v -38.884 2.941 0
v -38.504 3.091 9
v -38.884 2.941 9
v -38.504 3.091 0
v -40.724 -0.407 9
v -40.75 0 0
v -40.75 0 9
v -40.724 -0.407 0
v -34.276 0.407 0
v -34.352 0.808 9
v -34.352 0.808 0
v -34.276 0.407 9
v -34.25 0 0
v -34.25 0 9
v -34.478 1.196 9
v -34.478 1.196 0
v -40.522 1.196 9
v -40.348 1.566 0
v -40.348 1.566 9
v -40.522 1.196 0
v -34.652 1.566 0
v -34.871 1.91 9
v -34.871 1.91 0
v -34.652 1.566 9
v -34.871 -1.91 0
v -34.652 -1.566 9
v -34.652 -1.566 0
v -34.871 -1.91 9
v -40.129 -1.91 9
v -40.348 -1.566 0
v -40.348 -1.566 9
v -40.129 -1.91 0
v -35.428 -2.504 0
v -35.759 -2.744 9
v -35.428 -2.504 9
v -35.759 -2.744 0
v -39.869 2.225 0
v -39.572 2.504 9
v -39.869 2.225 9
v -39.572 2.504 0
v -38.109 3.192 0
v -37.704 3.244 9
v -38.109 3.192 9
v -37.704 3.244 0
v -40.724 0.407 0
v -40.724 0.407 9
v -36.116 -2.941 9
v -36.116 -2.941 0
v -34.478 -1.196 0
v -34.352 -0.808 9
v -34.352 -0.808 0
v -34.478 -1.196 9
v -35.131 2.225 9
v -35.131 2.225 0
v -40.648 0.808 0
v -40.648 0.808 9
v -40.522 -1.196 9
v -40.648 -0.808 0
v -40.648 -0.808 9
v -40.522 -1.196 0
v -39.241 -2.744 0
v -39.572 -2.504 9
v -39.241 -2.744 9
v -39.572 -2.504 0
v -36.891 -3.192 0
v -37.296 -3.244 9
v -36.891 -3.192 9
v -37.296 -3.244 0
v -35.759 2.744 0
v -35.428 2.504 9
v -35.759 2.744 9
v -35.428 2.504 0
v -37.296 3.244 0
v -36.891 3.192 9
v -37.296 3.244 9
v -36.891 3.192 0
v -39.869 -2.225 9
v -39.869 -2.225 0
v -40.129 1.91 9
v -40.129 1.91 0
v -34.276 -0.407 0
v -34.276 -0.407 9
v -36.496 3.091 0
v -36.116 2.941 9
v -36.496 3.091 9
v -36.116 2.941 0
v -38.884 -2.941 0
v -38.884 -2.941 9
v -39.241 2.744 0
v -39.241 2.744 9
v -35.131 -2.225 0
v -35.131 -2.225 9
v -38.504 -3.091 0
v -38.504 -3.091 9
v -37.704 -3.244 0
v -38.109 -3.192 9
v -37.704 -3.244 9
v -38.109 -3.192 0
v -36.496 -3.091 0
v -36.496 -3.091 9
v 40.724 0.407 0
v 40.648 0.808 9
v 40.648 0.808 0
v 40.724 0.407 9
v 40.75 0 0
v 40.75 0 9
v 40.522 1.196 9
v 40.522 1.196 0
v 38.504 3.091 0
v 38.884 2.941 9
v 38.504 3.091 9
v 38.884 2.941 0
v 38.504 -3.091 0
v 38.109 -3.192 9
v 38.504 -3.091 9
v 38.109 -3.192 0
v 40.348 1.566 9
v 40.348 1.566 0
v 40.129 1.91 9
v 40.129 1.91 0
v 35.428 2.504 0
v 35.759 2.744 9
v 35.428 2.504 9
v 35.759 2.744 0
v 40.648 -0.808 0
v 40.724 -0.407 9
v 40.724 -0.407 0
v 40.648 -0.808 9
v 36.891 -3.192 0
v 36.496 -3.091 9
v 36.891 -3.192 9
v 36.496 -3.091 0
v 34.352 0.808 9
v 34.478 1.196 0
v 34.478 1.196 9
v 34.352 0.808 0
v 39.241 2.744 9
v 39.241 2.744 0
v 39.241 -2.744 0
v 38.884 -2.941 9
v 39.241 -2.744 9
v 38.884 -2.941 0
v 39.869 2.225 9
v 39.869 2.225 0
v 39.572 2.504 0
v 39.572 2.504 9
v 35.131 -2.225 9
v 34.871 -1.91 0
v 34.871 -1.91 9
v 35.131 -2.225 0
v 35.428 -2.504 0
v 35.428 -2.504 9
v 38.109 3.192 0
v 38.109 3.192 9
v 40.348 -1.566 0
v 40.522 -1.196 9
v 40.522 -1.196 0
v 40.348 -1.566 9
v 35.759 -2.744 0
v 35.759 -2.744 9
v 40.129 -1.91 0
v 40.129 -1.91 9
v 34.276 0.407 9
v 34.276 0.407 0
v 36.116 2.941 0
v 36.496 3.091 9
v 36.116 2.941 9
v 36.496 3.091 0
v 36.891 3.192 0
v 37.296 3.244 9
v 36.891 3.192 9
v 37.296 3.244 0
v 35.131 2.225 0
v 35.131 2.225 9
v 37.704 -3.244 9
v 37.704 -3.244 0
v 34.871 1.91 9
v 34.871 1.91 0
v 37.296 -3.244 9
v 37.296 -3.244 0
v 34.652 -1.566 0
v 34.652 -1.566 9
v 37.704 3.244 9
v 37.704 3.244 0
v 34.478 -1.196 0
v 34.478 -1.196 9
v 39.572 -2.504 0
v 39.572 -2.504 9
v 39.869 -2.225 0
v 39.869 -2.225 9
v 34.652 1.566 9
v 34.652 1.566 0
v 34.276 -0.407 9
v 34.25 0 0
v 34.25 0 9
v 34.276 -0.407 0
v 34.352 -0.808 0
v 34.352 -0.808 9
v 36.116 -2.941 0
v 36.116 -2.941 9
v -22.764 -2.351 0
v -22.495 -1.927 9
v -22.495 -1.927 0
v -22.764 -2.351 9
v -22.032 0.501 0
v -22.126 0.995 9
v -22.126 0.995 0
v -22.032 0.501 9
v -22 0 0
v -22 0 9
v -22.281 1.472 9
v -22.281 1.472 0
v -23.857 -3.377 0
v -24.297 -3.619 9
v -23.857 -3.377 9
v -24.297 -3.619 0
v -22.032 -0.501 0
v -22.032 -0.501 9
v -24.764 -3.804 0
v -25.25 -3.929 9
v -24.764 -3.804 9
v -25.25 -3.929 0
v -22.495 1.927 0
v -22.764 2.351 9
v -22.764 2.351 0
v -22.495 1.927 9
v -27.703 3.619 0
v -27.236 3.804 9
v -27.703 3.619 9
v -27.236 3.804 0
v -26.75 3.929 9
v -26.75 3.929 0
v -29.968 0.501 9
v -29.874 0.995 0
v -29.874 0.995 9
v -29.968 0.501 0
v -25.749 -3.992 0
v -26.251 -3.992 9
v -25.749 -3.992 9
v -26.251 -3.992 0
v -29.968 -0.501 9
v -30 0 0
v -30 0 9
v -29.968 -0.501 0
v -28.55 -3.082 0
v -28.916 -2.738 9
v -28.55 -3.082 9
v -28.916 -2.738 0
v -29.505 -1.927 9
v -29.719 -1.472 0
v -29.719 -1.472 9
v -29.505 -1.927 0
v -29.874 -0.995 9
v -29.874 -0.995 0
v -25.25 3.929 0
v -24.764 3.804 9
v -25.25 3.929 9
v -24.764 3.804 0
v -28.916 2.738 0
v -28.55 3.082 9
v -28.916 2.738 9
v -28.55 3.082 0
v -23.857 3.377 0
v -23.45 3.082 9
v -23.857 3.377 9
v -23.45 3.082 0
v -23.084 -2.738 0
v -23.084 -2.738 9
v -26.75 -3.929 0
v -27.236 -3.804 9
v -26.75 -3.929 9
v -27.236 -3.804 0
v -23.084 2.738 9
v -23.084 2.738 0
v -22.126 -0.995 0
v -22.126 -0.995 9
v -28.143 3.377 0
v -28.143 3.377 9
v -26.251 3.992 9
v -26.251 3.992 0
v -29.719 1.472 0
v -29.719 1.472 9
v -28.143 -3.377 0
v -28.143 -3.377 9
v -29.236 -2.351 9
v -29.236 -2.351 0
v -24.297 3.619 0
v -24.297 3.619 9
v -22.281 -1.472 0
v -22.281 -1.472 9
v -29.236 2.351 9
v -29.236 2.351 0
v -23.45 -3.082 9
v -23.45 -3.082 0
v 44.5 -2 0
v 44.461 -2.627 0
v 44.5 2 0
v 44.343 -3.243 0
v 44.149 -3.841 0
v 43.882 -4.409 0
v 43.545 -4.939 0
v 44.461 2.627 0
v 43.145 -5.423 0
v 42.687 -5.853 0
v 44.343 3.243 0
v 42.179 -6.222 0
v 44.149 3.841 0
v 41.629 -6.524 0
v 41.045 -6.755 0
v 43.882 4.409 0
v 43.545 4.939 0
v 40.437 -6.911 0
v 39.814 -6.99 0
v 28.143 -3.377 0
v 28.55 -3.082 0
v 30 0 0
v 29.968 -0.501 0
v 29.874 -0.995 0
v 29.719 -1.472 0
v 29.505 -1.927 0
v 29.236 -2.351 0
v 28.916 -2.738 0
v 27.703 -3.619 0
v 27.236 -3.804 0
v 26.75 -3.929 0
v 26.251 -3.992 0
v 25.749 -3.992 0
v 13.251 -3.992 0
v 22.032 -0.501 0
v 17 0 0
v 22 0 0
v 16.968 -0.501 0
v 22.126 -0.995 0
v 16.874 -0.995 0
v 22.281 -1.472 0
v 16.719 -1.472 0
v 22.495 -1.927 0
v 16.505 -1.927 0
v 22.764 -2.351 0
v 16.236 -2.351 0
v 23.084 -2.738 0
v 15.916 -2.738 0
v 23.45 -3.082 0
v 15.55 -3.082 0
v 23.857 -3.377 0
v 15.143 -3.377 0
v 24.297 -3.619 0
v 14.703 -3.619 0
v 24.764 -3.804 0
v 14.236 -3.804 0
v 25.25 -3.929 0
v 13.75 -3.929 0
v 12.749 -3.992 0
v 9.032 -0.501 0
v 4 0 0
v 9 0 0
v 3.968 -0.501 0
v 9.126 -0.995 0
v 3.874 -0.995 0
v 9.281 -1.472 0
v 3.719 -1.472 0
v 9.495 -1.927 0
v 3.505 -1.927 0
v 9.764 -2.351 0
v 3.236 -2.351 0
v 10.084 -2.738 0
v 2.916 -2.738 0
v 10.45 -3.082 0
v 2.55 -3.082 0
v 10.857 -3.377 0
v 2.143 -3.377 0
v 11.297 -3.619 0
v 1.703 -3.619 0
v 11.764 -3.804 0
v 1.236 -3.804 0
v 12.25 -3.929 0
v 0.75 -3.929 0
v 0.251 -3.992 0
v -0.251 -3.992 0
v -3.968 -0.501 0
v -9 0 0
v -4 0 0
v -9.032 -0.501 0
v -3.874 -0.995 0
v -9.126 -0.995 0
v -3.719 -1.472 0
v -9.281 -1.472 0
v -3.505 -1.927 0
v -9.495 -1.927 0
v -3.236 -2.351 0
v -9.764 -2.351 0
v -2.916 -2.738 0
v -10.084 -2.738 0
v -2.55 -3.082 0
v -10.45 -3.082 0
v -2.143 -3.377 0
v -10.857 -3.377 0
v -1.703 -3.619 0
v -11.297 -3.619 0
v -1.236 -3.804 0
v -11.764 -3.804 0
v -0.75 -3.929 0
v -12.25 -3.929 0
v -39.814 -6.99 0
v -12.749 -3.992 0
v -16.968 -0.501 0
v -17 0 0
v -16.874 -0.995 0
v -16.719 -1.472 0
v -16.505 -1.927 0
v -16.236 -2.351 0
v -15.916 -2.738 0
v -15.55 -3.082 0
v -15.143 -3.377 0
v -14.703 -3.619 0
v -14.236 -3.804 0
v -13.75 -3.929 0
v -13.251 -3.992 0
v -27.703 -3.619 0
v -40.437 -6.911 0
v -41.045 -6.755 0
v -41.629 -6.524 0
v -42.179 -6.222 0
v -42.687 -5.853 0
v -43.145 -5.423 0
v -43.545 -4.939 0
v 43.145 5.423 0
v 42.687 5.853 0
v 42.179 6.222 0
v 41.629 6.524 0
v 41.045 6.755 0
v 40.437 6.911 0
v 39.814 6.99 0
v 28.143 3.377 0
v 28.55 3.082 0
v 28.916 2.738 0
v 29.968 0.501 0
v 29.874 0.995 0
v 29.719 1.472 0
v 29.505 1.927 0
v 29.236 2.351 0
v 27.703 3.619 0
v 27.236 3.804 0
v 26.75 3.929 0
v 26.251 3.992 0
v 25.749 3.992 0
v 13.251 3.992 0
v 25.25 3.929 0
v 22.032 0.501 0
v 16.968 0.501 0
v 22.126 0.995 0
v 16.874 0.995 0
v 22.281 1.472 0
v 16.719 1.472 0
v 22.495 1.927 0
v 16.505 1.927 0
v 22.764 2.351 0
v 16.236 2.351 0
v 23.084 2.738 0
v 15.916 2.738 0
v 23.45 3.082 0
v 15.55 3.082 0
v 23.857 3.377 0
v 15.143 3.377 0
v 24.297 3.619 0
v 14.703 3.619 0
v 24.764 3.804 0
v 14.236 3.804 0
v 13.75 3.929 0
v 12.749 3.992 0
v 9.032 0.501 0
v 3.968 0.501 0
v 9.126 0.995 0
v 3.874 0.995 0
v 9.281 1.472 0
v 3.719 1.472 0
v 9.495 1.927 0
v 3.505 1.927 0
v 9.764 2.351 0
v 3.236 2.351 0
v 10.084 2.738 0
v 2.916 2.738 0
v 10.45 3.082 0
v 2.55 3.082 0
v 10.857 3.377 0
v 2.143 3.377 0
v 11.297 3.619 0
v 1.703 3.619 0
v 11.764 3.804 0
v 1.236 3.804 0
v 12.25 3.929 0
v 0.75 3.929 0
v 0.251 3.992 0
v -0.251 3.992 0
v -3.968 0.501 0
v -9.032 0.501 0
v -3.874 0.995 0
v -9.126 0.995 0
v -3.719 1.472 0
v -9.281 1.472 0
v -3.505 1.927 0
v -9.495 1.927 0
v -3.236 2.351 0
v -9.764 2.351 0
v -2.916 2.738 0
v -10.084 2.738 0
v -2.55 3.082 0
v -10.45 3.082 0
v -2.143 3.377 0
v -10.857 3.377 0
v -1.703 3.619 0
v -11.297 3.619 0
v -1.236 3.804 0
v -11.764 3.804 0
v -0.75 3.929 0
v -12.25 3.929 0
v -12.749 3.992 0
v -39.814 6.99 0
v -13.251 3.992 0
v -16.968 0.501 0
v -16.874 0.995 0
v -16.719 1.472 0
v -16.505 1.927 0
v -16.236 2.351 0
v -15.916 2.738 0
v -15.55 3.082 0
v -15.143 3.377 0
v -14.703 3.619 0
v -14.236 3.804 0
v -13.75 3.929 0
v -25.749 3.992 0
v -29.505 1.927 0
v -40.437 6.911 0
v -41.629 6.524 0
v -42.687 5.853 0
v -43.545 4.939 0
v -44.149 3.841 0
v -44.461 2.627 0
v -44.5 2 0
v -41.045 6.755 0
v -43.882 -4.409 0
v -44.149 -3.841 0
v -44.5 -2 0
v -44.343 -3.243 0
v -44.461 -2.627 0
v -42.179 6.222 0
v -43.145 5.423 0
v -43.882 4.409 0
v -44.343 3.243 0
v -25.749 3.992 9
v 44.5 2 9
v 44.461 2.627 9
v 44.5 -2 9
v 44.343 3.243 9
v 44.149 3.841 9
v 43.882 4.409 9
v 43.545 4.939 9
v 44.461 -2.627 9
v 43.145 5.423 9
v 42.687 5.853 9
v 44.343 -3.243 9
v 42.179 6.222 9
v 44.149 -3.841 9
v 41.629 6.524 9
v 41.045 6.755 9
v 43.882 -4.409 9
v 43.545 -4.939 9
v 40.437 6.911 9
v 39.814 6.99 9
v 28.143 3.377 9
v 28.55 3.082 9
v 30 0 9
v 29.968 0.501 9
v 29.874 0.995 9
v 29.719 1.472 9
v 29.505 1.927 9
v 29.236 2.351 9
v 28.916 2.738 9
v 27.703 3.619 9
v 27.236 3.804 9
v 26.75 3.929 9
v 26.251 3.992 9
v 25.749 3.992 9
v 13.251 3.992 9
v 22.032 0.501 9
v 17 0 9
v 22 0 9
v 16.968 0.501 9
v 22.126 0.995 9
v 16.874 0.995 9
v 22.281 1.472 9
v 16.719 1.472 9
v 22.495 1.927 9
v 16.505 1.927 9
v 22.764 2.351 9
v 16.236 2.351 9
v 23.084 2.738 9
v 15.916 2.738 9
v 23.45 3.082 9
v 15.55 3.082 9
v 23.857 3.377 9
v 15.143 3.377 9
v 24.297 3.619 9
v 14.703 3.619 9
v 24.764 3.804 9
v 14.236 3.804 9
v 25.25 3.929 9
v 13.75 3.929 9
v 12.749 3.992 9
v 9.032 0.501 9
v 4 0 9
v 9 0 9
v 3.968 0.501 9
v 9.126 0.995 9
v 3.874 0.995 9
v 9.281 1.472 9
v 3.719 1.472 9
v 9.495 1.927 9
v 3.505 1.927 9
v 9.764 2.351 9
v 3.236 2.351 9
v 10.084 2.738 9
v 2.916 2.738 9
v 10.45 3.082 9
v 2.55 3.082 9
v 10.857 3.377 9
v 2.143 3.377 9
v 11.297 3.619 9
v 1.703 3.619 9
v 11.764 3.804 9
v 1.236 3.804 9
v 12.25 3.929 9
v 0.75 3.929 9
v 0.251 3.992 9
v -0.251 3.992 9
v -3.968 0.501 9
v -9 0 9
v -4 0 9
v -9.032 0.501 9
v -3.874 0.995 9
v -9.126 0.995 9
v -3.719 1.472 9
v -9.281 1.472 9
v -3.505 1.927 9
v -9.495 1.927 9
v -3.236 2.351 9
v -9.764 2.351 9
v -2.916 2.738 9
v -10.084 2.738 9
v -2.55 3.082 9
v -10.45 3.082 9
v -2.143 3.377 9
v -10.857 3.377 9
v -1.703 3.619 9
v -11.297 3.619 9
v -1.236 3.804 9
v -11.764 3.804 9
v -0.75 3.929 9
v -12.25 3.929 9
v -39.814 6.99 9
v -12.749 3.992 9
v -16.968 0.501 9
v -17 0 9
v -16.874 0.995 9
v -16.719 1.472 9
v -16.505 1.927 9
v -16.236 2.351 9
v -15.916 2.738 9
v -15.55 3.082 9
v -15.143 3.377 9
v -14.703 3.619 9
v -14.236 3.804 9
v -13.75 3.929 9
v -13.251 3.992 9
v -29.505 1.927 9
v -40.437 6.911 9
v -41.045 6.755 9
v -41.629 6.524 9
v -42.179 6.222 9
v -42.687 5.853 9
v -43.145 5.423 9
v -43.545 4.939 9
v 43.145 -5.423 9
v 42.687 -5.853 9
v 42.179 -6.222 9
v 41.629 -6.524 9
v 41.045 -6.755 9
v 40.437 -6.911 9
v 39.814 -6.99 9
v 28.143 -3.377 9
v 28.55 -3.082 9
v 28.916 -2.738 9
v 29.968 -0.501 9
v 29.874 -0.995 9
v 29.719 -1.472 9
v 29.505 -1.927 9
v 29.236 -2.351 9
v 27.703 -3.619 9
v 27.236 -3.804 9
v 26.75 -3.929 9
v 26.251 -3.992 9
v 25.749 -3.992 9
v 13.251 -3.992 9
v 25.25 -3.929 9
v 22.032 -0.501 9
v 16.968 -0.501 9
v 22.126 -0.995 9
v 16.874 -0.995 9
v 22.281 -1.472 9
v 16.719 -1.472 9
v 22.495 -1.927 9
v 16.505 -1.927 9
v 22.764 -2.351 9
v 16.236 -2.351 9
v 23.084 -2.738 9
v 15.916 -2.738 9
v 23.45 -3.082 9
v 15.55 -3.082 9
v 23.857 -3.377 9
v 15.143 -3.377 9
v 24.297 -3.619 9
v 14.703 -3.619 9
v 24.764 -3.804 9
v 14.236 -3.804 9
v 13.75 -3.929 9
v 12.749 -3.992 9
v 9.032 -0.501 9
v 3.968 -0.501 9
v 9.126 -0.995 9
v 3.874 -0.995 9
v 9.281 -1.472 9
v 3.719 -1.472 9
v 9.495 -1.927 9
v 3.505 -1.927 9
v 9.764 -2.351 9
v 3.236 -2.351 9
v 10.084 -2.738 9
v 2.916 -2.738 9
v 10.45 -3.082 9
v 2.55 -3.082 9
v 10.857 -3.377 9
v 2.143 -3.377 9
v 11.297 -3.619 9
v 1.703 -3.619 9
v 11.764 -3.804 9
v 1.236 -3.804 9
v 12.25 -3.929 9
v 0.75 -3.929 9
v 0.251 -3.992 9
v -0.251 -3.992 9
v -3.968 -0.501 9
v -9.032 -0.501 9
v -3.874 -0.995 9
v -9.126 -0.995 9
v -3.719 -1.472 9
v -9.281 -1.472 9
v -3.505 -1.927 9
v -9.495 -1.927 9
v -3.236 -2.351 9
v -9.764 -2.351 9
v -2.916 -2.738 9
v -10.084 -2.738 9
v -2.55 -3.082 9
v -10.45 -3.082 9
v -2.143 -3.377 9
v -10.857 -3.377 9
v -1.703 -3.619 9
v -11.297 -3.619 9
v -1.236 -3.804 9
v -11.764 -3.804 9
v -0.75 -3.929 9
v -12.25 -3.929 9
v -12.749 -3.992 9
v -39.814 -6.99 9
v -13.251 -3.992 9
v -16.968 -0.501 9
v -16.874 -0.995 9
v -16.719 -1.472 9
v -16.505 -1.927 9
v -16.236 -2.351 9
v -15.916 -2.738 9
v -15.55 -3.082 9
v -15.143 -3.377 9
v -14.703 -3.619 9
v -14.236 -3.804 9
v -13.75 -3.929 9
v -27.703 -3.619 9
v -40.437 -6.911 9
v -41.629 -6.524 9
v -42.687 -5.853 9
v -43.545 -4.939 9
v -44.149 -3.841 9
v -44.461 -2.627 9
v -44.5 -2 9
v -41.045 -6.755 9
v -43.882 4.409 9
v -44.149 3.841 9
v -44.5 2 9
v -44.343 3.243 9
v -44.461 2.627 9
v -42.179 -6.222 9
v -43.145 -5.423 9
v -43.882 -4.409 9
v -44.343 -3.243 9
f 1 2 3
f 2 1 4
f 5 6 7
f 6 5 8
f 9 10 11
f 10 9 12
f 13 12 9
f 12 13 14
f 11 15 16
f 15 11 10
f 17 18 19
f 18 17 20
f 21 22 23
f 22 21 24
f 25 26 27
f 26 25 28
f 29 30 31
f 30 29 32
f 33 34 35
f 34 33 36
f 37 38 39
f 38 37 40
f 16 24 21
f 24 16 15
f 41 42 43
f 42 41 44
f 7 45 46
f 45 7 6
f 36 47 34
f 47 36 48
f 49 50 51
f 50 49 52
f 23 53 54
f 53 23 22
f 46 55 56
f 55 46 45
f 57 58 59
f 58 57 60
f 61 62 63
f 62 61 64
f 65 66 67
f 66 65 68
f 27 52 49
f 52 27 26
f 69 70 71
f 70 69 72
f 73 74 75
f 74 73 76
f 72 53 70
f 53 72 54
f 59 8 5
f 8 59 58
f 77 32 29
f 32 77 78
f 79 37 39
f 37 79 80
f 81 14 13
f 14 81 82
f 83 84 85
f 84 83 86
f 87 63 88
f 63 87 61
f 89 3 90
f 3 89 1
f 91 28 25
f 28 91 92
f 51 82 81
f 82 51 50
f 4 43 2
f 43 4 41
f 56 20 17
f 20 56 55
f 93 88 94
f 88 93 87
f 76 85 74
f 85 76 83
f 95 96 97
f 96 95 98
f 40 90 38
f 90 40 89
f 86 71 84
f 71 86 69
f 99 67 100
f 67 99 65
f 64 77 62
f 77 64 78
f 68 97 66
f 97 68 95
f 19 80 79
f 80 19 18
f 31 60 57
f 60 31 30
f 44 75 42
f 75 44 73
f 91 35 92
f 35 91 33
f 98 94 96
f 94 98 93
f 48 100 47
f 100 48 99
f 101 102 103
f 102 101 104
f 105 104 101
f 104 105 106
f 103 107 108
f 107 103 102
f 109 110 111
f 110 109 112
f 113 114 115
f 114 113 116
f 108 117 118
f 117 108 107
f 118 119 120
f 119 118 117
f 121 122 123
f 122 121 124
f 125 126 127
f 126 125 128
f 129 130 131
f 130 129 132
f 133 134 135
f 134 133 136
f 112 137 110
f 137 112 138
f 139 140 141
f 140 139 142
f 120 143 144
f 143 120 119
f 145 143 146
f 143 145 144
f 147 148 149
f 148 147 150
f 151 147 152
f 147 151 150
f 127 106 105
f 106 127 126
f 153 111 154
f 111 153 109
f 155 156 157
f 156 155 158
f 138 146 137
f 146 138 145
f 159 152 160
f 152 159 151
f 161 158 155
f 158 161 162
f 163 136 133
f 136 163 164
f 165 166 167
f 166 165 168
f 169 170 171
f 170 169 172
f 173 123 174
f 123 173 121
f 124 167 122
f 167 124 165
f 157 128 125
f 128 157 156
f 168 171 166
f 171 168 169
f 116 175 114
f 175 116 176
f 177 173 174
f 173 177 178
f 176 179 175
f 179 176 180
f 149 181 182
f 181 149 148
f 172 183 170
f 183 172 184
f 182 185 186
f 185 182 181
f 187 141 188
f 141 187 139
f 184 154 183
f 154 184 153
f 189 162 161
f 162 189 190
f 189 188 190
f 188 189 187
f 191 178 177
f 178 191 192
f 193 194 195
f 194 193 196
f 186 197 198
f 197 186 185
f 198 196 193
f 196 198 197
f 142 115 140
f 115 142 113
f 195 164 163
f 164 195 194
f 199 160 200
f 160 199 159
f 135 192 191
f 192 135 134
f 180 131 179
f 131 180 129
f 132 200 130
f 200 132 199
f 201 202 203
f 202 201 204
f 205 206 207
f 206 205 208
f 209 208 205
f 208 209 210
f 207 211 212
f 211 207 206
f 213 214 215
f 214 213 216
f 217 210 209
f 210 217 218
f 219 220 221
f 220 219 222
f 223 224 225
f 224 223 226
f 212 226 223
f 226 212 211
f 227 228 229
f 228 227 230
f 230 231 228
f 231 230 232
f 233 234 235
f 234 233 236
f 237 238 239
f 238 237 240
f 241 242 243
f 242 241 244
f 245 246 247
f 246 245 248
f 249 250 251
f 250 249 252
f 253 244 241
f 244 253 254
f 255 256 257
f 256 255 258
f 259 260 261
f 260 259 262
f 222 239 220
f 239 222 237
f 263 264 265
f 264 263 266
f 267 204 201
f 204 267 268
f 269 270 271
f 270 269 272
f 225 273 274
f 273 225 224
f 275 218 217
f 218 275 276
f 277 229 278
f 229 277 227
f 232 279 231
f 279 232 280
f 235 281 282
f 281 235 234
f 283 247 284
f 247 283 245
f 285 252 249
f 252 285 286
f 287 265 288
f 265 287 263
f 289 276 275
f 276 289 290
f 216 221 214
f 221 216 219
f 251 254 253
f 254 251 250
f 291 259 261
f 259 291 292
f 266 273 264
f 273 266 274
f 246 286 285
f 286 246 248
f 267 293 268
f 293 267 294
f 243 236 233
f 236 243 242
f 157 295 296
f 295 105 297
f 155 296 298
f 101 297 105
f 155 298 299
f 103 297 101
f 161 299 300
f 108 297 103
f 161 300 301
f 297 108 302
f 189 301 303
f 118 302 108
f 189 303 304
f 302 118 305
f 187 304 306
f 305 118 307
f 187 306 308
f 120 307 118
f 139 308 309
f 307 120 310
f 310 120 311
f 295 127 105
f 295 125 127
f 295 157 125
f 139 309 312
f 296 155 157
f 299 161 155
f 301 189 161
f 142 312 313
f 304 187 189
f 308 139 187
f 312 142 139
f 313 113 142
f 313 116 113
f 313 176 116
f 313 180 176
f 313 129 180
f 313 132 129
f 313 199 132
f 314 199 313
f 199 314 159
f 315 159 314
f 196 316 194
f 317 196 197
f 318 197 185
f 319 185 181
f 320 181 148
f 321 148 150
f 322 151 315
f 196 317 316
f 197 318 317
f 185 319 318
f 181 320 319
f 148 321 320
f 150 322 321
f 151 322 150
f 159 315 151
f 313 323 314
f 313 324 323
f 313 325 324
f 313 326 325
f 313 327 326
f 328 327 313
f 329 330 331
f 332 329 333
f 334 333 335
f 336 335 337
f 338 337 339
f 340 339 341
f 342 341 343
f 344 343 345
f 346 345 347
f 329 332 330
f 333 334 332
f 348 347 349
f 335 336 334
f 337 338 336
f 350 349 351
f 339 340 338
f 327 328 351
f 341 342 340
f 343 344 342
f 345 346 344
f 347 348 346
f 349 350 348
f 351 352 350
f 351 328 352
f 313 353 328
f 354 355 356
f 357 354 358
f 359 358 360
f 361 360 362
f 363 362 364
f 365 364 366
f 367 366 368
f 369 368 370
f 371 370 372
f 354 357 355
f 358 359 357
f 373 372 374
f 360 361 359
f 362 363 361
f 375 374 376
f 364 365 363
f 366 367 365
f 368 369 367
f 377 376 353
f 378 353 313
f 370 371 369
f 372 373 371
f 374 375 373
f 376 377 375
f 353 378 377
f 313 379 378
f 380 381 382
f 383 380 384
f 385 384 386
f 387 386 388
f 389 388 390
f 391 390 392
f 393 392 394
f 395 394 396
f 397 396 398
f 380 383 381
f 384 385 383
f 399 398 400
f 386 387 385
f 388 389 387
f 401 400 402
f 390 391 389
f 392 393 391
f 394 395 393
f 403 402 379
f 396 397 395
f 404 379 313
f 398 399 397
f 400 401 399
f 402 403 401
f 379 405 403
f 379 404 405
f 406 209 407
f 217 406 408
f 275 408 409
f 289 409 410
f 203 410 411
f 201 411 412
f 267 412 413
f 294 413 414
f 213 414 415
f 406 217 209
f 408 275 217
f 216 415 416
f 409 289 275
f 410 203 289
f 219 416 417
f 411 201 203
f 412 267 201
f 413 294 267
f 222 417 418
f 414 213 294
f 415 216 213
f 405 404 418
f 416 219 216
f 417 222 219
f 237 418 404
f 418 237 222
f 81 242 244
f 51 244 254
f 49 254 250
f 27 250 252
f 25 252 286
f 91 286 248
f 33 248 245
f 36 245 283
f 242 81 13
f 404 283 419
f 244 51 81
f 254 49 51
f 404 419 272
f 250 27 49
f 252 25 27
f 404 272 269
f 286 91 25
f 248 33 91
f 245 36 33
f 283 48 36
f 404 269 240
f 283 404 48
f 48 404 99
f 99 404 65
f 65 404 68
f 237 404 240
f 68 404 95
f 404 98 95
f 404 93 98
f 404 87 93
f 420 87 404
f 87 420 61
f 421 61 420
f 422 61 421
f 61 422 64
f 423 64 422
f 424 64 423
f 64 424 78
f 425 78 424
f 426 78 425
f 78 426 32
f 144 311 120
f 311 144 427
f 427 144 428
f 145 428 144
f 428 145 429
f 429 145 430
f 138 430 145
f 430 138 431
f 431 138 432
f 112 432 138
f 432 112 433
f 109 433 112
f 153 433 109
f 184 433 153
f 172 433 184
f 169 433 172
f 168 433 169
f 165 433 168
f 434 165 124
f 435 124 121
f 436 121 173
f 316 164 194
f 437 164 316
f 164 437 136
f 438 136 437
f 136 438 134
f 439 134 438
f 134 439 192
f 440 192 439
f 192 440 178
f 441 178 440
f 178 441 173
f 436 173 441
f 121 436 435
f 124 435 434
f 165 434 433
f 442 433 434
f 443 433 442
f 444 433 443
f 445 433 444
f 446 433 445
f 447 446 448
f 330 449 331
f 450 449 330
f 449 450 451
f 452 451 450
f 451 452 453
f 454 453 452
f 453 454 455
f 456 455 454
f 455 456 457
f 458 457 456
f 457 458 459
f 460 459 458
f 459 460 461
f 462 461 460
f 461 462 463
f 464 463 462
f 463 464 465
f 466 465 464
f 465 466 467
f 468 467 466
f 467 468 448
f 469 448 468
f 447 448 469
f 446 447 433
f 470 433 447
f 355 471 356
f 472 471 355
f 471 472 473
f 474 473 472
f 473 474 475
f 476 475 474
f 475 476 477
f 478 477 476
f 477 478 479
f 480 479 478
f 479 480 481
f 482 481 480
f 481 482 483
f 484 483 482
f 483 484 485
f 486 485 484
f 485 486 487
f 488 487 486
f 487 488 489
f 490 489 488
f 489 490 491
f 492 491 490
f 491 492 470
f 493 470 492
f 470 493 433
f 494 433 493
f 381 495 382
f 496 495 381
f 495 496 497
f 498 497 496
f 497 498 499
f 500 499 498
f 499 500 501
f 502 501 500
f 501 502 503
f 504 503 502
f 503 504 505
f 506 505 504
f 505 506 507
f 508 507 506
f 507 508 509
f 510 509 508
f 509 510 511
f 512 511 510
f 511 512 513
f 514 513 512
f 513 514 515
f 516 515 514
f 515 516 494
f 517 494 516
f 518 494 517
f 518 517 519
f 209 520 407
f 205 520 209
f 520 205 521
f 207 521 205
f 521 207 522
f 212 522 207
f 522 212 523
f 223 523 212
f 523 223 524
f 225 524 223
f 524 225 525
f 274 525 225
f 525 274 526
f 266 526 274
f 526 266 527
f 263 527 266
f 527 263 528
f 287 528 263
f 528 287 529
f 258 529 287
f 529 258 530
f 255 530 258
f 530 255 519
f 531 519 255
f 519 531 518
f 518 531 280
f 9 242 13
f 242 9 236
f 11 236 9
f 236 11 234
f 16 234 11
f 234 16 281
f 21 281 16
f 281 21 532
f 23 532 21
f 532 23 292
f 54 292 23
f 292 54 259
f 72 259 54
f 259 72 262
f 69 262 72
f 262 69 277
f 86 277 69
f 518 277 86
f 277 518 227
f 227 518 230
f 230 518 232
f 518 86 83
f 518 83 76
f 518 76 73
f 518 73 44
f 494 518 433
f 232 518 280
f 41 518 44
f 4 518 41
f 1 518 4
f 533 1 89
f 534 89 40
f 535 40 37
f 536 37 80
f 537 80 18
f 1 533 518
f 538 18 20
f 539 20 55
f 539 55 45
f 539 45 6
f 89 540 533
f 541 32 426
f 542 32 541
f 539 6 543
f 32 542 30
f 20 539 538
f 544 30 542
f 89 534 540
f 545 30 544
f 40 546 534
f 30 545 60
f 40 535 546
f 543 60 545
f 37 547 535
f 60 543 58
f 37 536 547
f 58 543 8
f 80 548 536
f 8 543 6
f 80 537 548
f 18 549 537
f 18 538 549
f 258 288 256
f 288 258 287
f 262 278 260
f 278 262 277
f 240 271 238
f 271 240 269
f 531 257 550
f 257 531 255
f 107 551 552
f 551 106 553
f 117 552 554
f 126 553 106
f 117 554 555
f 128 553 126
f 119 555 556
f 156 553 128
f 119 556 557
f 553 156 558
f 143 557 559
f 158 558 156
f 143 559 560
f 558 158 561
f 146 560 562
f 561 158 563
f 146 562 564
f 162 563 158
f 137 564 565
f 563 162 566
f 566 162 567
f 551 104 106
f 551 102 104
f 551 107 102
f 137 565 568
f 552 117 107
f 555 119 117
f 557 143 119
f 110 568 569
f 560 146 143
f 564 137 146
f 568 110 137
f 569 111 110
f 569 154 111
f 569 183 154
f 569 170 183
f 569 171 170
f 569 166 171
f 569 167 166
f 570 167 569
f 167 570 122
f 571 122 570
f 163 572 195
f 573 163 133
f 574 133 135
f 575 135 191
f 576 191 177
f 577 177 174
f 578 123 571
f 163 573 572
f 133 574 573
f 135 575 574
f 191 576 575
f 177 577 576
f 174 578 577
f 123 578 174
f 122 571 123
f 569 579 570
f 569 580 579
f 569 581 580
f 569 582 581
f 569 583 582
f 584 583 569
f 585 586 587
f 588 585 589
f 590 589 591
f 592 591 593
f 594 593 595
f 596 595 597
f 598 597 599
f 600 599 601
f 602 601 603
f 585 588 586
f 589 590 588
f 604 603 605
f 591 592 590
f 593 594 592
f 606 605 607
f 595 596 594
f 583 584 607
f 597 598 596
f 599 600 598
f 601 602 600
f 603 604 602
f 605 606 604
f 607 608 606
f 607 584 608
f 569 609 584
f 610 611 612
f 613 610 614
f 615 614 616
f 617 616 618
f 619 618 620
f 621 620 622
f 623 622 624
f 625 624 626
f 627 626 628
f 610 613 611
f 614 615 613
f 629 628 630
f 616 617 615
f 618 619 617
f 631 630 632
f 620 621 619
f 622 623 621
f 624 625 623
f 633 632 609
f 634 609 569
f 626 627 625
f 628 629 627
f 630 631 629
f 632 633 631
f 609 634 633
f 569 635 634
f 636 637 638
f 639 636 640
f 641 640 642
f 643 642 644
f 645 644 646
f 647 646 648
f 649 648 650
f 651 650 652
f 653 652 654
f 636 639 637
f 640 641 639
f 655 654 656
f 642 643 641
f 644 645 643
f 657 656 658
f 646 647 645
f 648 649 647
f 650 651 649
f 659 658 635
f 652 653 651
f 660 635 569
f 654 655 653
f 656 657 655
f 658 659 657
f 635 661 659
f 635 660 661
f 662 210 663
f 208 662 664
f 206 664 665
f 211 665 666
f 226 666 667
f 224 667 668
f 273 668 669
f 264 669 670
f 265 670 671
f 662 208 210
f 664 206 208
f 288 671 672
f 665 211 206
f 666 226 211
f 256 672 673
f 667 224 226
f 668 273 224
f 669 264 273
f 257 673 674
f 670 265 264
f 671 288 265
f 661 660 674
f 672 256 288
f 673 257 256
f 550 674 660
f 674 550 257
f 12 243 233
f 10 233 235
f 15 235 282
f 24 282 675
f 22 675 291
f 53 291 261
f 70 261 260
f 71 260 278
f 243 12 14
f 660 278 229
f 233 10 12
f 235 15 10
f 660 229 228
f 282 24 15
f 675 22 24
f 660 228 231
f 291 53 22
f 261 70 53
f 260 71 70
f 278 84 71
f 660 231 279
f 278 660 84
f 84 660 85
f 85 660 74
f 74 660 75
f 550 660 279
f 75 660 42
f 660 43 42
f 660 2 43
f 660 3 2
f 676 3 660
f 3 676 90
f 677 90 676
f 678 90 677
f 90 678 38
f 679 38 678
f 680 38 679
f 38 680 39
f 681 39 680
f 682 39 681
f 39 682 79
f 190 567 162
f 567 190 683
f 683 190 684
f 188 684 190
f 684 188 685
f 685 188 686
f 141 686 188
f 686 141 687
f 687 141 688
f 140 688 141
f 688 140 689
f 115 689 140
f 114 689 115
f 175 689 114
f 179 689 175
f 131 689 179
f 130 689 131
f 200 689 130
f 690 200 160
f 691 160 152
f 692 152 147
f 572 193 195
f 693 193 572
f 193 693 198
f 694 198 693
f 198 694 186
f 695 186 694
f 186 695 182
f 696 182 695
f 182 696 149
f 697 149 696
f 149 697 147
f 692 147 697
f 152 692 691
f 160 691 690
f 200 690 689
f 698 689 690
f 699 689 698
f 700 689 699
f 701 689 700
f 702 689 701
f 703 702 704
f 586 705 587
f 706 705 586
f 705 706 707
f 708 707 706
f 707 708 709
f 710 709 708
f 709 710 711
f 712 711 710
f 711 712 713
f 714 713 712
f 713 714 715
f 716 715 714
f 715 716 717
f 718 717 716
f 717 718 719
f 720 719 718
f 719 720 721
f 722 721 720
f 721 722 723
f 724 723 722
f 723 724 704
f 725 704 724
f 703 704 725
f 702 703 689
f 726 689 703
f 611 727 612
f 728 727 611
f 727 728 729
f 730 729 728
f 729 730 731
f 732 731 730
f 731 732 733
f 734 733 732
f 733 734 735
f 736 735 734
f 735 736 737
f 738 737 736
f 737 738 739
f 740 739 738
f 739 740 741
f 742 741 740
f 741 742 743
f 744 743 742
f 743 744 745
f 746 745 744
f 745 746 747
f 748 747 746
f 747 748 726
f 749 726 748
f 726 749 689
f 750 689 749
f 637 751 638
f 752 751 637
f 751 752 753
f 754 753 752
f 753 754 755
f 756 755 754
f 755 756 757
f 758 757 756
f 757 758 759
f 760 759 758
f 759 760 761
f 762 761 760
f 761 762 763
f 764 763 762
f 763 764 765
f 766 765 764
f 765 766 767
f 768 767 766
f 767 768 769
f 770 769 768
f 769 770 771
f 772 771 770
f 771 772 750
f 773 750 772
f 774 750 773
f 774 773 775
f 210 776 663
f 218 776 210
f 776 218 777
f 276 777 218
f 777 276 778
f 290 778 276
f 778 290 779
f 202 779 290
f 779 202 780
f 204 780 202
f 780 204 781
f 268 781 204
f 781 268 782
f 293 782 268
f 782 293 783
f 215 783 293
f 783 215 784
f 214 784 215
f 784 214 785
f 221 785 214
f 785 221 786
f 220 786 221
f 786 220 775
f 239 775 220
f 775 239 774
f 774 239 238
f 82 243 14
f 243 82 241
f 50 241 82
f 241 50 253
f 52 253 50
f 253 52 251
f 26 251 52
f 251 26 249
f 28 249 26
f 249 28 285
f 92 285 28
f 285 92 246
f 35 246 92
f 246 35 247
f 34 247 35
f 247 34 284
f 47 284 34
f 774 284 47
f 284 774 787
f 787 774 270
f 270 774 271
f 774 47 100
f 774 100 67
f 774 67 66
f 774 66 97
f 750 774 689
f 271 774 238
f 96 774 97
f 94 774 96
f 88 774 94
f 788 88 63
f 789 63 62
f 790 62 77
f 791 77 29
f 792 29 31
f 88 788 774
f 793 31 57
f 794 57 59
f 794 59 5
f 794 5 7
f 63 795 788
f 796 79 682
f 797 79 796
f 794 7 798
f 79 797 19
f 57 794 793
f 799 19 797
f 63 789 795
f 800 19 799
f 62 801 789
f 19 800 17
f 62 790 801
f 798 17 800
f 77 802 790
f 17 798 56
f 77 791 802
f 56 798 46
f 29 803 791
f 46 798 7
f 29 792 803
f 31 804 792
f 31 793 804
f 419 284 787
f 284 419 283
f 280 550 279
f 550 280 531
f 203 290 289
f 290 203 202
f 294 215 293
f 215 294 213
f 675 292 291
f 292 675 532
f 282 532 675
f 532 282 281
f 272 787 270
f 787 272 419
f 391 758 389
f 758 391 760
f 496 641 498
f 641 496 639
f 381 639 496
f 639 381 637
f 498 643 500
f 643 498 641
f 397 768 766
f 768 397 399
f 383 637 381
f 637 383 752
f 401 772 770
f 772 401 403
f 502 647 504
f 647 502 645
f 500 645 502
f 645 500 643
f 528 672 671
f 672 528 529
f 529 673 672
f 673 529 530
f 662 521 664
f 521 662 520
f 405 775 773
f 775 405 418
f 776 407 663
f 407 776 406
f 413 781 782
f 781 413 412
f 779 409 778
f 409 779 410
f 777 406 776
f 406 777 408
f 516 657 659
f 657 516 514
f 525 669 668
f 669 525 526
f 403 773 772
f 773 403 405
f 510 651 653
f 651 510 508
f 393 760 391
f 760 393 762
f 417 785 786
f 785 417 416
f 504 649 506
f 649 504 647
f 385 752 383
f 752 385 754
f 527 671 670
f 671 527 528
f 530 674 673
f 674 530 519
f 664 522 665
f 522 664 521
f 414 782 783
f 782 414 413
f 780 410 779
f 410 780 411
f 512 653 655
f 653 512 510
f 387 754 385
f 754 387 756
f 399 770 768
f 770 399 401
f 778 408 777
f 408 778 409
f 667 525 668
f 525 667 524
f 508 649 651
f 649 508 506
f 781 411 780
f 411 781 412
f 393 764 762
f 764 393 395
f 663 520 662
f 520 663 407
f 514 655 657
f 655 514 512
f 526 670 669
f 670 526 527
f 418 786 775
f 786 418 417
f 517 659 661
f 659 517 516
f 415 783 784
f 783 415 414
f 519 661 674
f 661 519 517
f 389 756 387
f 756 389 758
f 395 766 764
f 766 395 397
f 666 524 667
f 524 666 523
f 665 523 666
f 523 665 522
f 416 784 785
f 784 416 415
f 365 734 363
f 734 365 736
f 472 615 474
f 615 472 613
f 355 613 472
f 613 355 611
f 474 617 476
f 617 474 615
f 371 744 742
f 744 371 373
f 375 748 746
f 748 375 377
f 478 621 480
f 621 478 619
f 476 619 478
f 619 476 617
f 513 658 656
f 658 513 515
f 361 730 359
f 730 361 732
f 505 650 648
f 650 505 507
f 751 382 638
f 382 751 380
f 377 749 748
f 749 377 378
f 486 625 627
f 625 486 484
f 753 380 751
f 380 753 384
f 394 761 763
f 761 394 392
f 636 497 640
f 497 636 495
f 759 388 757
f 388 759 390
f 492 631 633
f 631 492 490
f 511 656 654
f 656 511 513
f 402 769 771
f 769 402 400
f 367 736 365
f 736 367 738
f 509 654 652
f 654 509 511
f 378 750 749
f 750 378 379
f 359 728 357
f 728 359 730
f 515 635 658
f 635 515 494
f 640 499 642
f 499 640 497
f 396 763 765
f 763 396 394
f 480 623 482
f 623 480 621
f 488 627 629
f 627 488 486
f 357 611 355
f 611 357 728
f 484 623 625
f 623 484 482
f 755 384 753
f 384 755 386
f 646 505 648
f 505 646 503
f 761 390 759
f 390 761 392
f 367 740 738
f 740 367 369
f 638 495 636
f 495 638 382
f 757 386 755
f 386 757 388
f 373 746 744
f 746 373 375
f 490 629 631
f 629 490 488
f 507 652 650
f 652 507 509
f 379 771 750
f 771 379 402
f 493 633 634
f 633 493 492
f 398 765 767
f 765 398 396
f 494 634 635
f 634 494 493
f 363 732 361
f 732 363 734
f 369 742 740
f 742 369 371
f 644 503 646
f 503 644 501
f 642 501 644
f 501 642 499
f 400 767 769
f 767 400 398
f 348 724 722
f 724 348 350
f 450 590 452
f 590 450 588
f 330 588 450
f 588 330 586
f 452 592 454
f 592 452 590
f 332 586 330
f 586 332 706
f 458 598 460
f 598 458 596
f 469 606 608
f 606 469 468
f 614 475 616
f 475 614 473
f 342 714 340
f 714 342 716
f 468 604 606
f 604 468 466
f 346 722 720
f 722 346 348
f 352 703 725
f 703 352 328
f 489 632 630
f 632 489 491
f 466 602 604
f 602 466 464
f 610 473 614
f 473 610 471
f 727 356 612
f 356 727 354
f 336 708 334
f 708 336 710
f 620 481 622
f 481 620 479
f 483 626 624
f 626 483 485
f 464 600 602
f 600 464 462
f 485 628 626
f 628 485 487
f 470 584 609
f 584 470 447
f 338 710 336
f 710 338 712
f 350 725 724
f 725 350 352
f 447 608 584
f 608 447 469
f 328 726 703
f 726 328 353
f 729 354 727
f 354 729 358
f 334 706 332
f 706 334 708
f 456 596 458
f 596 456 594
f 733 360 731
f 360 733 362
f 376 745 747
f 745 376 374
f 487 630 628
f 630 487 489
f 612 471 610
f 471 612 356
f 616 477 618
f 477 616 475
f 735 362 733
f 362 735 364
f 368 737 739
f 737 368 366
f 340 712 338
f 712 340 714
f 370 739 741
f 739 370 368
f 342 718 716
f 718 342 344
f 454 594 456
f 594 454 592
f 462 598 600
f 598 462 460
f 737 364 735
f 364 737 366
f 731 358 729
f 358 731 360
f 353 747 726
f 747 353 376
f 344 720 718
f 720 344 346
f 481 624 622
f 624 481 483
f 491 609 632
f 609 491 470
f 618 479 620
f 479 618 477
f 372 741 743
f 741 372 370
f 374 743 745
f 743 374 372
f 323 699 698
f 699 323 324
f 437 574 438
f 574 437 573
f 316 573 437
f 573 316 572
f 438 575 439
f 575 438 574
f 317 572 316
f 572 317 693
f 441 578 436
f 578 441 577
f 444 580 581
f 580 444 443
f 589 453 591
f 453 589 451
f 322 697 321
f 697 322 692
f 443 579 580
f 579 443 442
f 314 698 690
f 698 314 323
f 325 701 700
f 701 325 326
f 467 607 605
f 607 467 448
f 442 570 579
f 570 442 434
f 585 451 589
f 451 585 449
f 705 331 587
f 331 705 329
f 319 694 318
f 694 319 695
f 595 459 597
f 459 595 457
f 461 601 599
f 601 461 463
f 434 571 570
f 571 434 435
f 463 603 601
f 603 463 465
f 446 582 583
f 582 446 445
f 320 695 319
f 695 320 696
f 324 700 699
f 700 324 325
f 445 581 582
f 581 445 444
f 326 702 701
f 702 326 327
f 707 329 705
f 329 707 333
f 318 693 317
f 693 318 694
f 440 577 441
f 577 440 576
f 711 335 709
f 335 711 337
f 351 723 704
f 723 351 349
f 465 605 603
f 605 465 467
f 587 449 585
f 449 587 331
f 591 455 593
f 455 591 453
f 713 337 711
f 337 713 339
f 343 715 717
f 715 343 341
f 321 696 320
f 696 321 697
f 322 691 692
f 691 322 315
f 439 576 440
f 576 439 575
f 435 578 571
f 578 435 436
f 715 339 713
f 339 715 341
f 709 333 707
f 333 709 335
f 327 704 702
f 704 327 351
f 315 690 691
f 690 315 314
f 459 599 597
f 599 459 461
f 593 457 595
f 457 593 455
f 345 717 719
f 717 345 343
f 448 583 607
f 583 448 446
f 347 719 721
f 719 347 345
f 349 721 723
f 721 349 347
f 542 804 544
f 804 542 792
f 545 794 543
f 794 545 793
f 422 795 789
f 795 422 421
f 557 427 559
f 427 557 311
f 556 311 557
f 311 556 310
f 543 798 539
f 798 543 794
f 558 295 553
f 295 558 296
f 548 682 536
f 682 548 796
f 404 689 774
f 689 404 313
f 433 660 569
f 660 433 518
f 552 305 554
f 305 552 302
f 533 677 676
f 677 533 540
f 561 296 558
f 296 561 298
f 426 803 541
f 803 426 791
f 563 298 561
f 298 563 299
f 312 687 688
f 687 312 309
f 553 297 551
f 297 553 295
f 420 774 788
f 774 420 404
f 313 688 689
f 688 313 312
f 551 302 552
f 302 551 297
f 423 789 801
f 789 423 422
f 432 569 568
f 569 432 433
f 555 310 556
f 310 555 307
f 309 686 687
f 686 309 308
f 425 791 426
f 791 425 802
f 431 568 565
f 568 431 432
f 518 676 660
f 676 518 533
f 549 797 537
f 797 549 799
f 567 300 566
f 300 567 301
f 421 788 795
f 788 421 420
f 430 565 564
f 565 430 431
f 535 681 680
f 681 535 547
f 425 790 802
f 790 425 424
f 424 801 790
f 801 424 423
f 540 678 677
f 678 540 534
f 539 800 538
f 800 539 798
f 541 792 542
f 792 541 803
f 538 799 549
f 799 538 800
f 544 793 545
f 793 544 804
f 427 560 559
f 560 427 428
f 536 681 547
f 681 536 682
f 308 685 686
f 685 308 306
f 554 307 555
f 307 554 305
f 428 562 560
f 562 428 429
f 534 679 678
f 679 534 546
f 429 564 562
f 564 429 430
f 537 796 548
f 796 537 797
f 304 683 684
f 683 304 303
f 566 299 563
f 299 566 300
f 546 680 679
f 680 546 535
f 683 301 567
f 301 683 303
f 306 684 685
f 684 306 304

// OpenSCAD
$fn = 50;


difference() {
	union() {
		hull() {
			translate(v = [-39.5000000000, 2.0000000000, 0]) {
				cylinder(h = 9, r = 5);
			}
			translate(v = [39.5000000000, 2.0000000000, 0]) {
				cylinder(h = 9, r = 5);
			}
			translate(v = [-39.5000000000, -2.0000000000, 0]) {
				cylinder(h = 9, r = 5);
			}
			translate(v = [39.5000000000, -2.0000000000, 0]) {
				cylinder(h = 9, r = 5);
			}
		}
	}
	union() {
		#translate(v = [-37.5000000000, 0.0000000000, 0]) {
			cylinder(h = 9, r = 3.2500000000);
		}
		#translate(v = [37.5000000000, 0.0000000000, 0]) {
			cylinder(h = 9, r = 3.2500000000);
		}
		#translate(v = [-37.5000000000, 0.0000000000, -100.0000000000]) {
			cylinder(h = 200, r = 3.2500000000);
		}
		#translate(v = [-37.5000000000, 0.0000000000, -100.0000000000]) {
			cylinder(h = 200, r = 3.2500000000);
		}
		#translate(v = [37.5000000000, 0.0000000000, -100.0000000000]) {
			cylinder(h = 200, r = 3.2500000000);
		}
		#translate(v = [37.5000000000, 0.0000000000, -100.0000000000]) {
			cylinder(h = 200, r = 3.2500000000);
		}
		#translate(v = [-37.5000000000, 0.0000000000, 0]) {
			cylinder(h = 9, r = 1.8000000000);
		}
		#translate(v = [37.5000000000, 0.0000000000, 0]) {
			cylinder(h = 9, r = 1.8000000000);
		}
		#translate(v = [-37.5000000000, 0.0000000000, 0]) {
			cylinder(h = 9, r = 1.8000000000);
		}
		#translate(v = [37.5000000000, 0.0000000000, 0]) {
			cylinder(h = 9, r = 1.8000000000);
		}
		#translate(v = [-37.5000000000, 0.0000000000, 0]) {
			cylinder(h = 9, r = 1.8000000000);
		}
		#translate(v = [37.5000000000, 0.0000000000, 0]) {
			cylinder(h = 9, r = 1.8000000000);
		}
		#translate(v = [-26.0000000000, 0, 0]) {
			cylinder(h = 9, r = 4.0000000000);
		}
		#translate(v = [-13.0000000000, 0, 0]) {
			cylinder(h = 9, r = 4.0000000000);
		}
		#cylinder(h = 9, r = 4.0000000000);
		#translate(v = [13.0000000000, 0, 0]) {
			cylinder(h = 9, r = 4.0000000000);
		}
		#translate(v = [26.0000000000, 0, 0]) {
			cylinder(h = 9, r = 4.0000000000);
		}
	}
}
